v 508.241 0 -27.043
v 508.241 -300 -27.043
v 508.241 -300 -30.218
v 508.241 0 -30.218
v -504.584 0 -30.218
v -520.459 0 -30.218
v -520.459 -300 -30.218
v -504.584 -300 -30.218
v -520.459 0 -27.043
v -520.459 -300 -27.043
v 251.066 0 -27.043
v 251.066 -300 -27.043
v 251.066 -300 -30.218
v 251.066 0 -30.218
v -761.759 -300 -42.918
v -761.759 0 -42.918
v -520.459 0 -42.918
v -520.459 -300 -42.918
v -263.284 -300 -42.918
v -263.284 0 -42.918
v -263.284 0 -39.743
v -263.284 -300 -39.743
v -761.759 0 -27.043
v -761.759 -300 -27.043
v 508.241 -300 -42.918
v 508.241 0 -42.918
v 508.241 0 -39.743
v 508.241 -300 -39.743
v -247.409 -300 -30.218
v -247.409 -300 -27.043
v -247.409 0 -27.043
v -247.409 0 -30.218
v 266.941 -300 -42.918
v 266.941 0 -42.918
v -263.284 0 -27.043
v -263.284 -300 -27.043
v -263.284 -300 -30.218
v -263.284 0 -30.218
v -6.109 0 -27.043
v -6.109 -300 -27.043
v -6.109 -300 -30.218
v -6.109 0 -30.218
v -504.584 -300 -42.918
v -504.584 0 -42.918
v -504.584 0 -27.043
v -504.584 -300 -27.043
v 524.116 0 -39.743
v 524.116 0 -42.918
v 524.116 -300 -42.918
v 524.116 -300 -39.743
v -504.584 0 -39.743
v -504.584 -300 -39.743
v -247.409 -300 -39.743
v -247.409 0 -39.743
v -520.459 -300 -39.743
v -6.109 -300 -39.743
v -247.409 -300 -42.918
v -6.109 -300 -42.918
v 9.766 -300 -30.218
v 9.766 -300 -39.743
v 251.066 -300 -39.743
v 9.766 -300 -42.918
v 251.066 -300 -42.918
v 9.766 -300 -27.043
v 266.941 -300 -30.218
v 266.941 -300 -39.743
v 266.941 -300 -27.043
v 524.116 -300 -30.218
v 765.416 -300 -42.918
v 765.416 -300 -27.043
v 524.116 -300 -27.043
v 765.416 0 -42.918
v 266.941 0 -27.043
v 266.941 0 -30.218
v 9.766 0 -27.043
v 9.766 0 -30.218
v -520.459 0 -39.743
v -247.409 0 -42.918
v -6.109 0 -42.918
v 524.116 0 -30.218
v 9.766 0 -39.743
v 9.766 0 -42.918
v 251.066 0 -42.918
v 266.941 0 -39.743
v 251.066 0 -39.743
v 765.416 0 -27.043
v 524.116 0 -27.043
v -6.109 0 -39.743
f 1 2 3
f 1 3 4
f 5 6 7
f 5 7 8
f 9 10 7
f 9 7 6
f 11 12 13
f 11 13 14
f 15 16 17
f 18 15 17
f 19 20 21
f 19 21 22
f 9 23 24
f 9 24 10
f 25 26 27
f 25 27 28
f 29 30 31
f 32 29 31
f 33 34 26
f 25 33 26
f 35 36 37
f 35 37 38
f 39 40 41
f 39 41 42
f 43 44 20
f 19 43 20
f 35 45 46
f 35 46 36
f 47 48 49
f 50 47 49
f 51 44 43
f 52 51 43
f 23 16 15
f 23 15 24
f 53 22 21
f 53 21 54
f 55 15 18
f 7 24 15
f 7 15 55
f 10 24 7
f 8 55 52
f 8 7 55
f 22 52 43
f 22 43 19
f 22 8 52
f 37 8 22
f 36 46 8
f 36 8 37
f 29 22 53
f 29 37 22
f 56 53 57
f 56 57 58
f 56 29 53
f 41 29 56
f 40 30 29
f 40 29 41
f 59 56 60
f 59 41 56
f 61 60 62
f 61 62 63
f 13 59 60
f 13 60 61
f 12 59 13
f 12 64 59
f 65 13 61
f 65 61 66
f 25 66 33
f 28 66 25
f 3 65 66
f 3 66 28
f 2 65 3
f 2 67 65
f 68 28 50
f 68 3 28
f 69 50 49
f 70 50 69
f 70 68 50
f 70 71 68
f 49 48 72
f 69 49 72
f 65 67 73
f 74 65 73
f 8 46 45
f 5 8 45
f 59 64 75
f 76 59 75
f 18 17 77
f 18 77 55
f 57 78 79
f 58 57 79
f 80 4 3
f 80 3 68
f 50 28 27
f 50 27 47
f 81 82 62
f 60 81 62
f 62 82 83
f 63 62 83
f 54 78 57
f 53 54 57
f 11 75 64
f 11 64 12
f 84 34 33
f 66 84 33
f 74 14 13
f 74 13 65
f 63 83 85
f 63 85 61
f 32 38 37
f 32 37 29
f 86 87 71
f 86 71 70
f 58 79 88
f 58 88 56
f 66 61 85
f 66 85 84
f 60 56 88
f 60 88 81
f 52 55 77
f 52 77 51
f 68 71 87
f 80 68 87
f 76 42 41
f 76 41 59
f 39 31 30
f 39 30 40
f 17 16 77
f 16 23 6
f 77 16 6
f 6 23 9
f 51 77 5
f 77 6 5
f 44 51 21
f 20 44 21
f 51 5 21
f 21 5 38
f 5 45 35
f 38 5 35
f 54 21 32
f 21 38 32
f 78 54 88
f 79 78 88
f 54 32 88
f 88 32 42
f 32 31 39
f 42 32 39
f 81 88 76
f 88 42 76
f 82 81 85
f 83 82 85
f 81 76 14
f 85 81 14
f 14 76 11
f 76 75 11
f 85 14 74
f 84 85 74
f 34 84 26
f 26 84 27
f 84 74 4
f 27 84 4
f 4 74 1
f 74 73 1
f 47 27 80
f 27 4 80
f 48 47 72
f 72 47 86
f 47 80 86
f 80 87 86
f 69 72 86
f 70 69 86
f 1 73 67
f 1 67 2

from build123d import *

# Parameters (mm, degrees)
F0_W     = 1527.175
F0_H     = 15.875
F1_DEPTH = 300
F2_W     = 15.875
F2_H     = 300
F3_DEPTH = 3.175
F4_W     = 15.875
F4_H     = 300
F5_DEPTH = 3.175


with BuildPart() as f1:
    # F0 (on Front) → F1 (new body)
    with BuildSketch(Plane.XZ):
        with Locations((1.828803, -34.980267)):
            Rectangle(F0_W, F0_H)
    extrude(amount=F1_DEPTH)

    # F2 (on face) → F3 (cut)
    with BuildSketch(Plane(origin=(0, 0, -42.917767), x_dir=(1, 0, 0), z_dir=(0, 0, -1))):
        with Locations((-255.346197, 150)):
            Rectangle(F2_W, F2_H)
        with Locations((1.828803, 150)):
            Rectangle(F2_W, F2_H)
        with Locations((-512.521197, 150)):
            Rectangle(F2_W, F2_H)
        with Locations((259.003803, 150)):
            Rectangle(F2_W, F2_H)
        with Locations((516.178803, 150)):
            Rectangle(F2_W, F2_H)
    extrude(amount=-F3_DEPTH, mode=Mode.SUBTRACT)

    # F4 (on face) → F5 (cut)
    with BuildSketch(Plane.XY.offset(-27.042767)):
        with Locations((-512.521197, -150)):
            Rectangle(F4_W, F4_H)
        with Locations((-255.346197, -150)):
            Rectangle(F4_W, F4_H)
        with Locations((1.828803, -150)):
            Rectangle(F4_W, F4_H)
        with Locations((259.003803, -150)):
            Rectangle(F4_W, F4_H)
        with Locations((516.178803, -150)):
            Rectangle(F4_W, F4_H)
    extrude(amount=-F5_DEPTH, mode=Mode.SUBTRACT)


solid = f1.part
